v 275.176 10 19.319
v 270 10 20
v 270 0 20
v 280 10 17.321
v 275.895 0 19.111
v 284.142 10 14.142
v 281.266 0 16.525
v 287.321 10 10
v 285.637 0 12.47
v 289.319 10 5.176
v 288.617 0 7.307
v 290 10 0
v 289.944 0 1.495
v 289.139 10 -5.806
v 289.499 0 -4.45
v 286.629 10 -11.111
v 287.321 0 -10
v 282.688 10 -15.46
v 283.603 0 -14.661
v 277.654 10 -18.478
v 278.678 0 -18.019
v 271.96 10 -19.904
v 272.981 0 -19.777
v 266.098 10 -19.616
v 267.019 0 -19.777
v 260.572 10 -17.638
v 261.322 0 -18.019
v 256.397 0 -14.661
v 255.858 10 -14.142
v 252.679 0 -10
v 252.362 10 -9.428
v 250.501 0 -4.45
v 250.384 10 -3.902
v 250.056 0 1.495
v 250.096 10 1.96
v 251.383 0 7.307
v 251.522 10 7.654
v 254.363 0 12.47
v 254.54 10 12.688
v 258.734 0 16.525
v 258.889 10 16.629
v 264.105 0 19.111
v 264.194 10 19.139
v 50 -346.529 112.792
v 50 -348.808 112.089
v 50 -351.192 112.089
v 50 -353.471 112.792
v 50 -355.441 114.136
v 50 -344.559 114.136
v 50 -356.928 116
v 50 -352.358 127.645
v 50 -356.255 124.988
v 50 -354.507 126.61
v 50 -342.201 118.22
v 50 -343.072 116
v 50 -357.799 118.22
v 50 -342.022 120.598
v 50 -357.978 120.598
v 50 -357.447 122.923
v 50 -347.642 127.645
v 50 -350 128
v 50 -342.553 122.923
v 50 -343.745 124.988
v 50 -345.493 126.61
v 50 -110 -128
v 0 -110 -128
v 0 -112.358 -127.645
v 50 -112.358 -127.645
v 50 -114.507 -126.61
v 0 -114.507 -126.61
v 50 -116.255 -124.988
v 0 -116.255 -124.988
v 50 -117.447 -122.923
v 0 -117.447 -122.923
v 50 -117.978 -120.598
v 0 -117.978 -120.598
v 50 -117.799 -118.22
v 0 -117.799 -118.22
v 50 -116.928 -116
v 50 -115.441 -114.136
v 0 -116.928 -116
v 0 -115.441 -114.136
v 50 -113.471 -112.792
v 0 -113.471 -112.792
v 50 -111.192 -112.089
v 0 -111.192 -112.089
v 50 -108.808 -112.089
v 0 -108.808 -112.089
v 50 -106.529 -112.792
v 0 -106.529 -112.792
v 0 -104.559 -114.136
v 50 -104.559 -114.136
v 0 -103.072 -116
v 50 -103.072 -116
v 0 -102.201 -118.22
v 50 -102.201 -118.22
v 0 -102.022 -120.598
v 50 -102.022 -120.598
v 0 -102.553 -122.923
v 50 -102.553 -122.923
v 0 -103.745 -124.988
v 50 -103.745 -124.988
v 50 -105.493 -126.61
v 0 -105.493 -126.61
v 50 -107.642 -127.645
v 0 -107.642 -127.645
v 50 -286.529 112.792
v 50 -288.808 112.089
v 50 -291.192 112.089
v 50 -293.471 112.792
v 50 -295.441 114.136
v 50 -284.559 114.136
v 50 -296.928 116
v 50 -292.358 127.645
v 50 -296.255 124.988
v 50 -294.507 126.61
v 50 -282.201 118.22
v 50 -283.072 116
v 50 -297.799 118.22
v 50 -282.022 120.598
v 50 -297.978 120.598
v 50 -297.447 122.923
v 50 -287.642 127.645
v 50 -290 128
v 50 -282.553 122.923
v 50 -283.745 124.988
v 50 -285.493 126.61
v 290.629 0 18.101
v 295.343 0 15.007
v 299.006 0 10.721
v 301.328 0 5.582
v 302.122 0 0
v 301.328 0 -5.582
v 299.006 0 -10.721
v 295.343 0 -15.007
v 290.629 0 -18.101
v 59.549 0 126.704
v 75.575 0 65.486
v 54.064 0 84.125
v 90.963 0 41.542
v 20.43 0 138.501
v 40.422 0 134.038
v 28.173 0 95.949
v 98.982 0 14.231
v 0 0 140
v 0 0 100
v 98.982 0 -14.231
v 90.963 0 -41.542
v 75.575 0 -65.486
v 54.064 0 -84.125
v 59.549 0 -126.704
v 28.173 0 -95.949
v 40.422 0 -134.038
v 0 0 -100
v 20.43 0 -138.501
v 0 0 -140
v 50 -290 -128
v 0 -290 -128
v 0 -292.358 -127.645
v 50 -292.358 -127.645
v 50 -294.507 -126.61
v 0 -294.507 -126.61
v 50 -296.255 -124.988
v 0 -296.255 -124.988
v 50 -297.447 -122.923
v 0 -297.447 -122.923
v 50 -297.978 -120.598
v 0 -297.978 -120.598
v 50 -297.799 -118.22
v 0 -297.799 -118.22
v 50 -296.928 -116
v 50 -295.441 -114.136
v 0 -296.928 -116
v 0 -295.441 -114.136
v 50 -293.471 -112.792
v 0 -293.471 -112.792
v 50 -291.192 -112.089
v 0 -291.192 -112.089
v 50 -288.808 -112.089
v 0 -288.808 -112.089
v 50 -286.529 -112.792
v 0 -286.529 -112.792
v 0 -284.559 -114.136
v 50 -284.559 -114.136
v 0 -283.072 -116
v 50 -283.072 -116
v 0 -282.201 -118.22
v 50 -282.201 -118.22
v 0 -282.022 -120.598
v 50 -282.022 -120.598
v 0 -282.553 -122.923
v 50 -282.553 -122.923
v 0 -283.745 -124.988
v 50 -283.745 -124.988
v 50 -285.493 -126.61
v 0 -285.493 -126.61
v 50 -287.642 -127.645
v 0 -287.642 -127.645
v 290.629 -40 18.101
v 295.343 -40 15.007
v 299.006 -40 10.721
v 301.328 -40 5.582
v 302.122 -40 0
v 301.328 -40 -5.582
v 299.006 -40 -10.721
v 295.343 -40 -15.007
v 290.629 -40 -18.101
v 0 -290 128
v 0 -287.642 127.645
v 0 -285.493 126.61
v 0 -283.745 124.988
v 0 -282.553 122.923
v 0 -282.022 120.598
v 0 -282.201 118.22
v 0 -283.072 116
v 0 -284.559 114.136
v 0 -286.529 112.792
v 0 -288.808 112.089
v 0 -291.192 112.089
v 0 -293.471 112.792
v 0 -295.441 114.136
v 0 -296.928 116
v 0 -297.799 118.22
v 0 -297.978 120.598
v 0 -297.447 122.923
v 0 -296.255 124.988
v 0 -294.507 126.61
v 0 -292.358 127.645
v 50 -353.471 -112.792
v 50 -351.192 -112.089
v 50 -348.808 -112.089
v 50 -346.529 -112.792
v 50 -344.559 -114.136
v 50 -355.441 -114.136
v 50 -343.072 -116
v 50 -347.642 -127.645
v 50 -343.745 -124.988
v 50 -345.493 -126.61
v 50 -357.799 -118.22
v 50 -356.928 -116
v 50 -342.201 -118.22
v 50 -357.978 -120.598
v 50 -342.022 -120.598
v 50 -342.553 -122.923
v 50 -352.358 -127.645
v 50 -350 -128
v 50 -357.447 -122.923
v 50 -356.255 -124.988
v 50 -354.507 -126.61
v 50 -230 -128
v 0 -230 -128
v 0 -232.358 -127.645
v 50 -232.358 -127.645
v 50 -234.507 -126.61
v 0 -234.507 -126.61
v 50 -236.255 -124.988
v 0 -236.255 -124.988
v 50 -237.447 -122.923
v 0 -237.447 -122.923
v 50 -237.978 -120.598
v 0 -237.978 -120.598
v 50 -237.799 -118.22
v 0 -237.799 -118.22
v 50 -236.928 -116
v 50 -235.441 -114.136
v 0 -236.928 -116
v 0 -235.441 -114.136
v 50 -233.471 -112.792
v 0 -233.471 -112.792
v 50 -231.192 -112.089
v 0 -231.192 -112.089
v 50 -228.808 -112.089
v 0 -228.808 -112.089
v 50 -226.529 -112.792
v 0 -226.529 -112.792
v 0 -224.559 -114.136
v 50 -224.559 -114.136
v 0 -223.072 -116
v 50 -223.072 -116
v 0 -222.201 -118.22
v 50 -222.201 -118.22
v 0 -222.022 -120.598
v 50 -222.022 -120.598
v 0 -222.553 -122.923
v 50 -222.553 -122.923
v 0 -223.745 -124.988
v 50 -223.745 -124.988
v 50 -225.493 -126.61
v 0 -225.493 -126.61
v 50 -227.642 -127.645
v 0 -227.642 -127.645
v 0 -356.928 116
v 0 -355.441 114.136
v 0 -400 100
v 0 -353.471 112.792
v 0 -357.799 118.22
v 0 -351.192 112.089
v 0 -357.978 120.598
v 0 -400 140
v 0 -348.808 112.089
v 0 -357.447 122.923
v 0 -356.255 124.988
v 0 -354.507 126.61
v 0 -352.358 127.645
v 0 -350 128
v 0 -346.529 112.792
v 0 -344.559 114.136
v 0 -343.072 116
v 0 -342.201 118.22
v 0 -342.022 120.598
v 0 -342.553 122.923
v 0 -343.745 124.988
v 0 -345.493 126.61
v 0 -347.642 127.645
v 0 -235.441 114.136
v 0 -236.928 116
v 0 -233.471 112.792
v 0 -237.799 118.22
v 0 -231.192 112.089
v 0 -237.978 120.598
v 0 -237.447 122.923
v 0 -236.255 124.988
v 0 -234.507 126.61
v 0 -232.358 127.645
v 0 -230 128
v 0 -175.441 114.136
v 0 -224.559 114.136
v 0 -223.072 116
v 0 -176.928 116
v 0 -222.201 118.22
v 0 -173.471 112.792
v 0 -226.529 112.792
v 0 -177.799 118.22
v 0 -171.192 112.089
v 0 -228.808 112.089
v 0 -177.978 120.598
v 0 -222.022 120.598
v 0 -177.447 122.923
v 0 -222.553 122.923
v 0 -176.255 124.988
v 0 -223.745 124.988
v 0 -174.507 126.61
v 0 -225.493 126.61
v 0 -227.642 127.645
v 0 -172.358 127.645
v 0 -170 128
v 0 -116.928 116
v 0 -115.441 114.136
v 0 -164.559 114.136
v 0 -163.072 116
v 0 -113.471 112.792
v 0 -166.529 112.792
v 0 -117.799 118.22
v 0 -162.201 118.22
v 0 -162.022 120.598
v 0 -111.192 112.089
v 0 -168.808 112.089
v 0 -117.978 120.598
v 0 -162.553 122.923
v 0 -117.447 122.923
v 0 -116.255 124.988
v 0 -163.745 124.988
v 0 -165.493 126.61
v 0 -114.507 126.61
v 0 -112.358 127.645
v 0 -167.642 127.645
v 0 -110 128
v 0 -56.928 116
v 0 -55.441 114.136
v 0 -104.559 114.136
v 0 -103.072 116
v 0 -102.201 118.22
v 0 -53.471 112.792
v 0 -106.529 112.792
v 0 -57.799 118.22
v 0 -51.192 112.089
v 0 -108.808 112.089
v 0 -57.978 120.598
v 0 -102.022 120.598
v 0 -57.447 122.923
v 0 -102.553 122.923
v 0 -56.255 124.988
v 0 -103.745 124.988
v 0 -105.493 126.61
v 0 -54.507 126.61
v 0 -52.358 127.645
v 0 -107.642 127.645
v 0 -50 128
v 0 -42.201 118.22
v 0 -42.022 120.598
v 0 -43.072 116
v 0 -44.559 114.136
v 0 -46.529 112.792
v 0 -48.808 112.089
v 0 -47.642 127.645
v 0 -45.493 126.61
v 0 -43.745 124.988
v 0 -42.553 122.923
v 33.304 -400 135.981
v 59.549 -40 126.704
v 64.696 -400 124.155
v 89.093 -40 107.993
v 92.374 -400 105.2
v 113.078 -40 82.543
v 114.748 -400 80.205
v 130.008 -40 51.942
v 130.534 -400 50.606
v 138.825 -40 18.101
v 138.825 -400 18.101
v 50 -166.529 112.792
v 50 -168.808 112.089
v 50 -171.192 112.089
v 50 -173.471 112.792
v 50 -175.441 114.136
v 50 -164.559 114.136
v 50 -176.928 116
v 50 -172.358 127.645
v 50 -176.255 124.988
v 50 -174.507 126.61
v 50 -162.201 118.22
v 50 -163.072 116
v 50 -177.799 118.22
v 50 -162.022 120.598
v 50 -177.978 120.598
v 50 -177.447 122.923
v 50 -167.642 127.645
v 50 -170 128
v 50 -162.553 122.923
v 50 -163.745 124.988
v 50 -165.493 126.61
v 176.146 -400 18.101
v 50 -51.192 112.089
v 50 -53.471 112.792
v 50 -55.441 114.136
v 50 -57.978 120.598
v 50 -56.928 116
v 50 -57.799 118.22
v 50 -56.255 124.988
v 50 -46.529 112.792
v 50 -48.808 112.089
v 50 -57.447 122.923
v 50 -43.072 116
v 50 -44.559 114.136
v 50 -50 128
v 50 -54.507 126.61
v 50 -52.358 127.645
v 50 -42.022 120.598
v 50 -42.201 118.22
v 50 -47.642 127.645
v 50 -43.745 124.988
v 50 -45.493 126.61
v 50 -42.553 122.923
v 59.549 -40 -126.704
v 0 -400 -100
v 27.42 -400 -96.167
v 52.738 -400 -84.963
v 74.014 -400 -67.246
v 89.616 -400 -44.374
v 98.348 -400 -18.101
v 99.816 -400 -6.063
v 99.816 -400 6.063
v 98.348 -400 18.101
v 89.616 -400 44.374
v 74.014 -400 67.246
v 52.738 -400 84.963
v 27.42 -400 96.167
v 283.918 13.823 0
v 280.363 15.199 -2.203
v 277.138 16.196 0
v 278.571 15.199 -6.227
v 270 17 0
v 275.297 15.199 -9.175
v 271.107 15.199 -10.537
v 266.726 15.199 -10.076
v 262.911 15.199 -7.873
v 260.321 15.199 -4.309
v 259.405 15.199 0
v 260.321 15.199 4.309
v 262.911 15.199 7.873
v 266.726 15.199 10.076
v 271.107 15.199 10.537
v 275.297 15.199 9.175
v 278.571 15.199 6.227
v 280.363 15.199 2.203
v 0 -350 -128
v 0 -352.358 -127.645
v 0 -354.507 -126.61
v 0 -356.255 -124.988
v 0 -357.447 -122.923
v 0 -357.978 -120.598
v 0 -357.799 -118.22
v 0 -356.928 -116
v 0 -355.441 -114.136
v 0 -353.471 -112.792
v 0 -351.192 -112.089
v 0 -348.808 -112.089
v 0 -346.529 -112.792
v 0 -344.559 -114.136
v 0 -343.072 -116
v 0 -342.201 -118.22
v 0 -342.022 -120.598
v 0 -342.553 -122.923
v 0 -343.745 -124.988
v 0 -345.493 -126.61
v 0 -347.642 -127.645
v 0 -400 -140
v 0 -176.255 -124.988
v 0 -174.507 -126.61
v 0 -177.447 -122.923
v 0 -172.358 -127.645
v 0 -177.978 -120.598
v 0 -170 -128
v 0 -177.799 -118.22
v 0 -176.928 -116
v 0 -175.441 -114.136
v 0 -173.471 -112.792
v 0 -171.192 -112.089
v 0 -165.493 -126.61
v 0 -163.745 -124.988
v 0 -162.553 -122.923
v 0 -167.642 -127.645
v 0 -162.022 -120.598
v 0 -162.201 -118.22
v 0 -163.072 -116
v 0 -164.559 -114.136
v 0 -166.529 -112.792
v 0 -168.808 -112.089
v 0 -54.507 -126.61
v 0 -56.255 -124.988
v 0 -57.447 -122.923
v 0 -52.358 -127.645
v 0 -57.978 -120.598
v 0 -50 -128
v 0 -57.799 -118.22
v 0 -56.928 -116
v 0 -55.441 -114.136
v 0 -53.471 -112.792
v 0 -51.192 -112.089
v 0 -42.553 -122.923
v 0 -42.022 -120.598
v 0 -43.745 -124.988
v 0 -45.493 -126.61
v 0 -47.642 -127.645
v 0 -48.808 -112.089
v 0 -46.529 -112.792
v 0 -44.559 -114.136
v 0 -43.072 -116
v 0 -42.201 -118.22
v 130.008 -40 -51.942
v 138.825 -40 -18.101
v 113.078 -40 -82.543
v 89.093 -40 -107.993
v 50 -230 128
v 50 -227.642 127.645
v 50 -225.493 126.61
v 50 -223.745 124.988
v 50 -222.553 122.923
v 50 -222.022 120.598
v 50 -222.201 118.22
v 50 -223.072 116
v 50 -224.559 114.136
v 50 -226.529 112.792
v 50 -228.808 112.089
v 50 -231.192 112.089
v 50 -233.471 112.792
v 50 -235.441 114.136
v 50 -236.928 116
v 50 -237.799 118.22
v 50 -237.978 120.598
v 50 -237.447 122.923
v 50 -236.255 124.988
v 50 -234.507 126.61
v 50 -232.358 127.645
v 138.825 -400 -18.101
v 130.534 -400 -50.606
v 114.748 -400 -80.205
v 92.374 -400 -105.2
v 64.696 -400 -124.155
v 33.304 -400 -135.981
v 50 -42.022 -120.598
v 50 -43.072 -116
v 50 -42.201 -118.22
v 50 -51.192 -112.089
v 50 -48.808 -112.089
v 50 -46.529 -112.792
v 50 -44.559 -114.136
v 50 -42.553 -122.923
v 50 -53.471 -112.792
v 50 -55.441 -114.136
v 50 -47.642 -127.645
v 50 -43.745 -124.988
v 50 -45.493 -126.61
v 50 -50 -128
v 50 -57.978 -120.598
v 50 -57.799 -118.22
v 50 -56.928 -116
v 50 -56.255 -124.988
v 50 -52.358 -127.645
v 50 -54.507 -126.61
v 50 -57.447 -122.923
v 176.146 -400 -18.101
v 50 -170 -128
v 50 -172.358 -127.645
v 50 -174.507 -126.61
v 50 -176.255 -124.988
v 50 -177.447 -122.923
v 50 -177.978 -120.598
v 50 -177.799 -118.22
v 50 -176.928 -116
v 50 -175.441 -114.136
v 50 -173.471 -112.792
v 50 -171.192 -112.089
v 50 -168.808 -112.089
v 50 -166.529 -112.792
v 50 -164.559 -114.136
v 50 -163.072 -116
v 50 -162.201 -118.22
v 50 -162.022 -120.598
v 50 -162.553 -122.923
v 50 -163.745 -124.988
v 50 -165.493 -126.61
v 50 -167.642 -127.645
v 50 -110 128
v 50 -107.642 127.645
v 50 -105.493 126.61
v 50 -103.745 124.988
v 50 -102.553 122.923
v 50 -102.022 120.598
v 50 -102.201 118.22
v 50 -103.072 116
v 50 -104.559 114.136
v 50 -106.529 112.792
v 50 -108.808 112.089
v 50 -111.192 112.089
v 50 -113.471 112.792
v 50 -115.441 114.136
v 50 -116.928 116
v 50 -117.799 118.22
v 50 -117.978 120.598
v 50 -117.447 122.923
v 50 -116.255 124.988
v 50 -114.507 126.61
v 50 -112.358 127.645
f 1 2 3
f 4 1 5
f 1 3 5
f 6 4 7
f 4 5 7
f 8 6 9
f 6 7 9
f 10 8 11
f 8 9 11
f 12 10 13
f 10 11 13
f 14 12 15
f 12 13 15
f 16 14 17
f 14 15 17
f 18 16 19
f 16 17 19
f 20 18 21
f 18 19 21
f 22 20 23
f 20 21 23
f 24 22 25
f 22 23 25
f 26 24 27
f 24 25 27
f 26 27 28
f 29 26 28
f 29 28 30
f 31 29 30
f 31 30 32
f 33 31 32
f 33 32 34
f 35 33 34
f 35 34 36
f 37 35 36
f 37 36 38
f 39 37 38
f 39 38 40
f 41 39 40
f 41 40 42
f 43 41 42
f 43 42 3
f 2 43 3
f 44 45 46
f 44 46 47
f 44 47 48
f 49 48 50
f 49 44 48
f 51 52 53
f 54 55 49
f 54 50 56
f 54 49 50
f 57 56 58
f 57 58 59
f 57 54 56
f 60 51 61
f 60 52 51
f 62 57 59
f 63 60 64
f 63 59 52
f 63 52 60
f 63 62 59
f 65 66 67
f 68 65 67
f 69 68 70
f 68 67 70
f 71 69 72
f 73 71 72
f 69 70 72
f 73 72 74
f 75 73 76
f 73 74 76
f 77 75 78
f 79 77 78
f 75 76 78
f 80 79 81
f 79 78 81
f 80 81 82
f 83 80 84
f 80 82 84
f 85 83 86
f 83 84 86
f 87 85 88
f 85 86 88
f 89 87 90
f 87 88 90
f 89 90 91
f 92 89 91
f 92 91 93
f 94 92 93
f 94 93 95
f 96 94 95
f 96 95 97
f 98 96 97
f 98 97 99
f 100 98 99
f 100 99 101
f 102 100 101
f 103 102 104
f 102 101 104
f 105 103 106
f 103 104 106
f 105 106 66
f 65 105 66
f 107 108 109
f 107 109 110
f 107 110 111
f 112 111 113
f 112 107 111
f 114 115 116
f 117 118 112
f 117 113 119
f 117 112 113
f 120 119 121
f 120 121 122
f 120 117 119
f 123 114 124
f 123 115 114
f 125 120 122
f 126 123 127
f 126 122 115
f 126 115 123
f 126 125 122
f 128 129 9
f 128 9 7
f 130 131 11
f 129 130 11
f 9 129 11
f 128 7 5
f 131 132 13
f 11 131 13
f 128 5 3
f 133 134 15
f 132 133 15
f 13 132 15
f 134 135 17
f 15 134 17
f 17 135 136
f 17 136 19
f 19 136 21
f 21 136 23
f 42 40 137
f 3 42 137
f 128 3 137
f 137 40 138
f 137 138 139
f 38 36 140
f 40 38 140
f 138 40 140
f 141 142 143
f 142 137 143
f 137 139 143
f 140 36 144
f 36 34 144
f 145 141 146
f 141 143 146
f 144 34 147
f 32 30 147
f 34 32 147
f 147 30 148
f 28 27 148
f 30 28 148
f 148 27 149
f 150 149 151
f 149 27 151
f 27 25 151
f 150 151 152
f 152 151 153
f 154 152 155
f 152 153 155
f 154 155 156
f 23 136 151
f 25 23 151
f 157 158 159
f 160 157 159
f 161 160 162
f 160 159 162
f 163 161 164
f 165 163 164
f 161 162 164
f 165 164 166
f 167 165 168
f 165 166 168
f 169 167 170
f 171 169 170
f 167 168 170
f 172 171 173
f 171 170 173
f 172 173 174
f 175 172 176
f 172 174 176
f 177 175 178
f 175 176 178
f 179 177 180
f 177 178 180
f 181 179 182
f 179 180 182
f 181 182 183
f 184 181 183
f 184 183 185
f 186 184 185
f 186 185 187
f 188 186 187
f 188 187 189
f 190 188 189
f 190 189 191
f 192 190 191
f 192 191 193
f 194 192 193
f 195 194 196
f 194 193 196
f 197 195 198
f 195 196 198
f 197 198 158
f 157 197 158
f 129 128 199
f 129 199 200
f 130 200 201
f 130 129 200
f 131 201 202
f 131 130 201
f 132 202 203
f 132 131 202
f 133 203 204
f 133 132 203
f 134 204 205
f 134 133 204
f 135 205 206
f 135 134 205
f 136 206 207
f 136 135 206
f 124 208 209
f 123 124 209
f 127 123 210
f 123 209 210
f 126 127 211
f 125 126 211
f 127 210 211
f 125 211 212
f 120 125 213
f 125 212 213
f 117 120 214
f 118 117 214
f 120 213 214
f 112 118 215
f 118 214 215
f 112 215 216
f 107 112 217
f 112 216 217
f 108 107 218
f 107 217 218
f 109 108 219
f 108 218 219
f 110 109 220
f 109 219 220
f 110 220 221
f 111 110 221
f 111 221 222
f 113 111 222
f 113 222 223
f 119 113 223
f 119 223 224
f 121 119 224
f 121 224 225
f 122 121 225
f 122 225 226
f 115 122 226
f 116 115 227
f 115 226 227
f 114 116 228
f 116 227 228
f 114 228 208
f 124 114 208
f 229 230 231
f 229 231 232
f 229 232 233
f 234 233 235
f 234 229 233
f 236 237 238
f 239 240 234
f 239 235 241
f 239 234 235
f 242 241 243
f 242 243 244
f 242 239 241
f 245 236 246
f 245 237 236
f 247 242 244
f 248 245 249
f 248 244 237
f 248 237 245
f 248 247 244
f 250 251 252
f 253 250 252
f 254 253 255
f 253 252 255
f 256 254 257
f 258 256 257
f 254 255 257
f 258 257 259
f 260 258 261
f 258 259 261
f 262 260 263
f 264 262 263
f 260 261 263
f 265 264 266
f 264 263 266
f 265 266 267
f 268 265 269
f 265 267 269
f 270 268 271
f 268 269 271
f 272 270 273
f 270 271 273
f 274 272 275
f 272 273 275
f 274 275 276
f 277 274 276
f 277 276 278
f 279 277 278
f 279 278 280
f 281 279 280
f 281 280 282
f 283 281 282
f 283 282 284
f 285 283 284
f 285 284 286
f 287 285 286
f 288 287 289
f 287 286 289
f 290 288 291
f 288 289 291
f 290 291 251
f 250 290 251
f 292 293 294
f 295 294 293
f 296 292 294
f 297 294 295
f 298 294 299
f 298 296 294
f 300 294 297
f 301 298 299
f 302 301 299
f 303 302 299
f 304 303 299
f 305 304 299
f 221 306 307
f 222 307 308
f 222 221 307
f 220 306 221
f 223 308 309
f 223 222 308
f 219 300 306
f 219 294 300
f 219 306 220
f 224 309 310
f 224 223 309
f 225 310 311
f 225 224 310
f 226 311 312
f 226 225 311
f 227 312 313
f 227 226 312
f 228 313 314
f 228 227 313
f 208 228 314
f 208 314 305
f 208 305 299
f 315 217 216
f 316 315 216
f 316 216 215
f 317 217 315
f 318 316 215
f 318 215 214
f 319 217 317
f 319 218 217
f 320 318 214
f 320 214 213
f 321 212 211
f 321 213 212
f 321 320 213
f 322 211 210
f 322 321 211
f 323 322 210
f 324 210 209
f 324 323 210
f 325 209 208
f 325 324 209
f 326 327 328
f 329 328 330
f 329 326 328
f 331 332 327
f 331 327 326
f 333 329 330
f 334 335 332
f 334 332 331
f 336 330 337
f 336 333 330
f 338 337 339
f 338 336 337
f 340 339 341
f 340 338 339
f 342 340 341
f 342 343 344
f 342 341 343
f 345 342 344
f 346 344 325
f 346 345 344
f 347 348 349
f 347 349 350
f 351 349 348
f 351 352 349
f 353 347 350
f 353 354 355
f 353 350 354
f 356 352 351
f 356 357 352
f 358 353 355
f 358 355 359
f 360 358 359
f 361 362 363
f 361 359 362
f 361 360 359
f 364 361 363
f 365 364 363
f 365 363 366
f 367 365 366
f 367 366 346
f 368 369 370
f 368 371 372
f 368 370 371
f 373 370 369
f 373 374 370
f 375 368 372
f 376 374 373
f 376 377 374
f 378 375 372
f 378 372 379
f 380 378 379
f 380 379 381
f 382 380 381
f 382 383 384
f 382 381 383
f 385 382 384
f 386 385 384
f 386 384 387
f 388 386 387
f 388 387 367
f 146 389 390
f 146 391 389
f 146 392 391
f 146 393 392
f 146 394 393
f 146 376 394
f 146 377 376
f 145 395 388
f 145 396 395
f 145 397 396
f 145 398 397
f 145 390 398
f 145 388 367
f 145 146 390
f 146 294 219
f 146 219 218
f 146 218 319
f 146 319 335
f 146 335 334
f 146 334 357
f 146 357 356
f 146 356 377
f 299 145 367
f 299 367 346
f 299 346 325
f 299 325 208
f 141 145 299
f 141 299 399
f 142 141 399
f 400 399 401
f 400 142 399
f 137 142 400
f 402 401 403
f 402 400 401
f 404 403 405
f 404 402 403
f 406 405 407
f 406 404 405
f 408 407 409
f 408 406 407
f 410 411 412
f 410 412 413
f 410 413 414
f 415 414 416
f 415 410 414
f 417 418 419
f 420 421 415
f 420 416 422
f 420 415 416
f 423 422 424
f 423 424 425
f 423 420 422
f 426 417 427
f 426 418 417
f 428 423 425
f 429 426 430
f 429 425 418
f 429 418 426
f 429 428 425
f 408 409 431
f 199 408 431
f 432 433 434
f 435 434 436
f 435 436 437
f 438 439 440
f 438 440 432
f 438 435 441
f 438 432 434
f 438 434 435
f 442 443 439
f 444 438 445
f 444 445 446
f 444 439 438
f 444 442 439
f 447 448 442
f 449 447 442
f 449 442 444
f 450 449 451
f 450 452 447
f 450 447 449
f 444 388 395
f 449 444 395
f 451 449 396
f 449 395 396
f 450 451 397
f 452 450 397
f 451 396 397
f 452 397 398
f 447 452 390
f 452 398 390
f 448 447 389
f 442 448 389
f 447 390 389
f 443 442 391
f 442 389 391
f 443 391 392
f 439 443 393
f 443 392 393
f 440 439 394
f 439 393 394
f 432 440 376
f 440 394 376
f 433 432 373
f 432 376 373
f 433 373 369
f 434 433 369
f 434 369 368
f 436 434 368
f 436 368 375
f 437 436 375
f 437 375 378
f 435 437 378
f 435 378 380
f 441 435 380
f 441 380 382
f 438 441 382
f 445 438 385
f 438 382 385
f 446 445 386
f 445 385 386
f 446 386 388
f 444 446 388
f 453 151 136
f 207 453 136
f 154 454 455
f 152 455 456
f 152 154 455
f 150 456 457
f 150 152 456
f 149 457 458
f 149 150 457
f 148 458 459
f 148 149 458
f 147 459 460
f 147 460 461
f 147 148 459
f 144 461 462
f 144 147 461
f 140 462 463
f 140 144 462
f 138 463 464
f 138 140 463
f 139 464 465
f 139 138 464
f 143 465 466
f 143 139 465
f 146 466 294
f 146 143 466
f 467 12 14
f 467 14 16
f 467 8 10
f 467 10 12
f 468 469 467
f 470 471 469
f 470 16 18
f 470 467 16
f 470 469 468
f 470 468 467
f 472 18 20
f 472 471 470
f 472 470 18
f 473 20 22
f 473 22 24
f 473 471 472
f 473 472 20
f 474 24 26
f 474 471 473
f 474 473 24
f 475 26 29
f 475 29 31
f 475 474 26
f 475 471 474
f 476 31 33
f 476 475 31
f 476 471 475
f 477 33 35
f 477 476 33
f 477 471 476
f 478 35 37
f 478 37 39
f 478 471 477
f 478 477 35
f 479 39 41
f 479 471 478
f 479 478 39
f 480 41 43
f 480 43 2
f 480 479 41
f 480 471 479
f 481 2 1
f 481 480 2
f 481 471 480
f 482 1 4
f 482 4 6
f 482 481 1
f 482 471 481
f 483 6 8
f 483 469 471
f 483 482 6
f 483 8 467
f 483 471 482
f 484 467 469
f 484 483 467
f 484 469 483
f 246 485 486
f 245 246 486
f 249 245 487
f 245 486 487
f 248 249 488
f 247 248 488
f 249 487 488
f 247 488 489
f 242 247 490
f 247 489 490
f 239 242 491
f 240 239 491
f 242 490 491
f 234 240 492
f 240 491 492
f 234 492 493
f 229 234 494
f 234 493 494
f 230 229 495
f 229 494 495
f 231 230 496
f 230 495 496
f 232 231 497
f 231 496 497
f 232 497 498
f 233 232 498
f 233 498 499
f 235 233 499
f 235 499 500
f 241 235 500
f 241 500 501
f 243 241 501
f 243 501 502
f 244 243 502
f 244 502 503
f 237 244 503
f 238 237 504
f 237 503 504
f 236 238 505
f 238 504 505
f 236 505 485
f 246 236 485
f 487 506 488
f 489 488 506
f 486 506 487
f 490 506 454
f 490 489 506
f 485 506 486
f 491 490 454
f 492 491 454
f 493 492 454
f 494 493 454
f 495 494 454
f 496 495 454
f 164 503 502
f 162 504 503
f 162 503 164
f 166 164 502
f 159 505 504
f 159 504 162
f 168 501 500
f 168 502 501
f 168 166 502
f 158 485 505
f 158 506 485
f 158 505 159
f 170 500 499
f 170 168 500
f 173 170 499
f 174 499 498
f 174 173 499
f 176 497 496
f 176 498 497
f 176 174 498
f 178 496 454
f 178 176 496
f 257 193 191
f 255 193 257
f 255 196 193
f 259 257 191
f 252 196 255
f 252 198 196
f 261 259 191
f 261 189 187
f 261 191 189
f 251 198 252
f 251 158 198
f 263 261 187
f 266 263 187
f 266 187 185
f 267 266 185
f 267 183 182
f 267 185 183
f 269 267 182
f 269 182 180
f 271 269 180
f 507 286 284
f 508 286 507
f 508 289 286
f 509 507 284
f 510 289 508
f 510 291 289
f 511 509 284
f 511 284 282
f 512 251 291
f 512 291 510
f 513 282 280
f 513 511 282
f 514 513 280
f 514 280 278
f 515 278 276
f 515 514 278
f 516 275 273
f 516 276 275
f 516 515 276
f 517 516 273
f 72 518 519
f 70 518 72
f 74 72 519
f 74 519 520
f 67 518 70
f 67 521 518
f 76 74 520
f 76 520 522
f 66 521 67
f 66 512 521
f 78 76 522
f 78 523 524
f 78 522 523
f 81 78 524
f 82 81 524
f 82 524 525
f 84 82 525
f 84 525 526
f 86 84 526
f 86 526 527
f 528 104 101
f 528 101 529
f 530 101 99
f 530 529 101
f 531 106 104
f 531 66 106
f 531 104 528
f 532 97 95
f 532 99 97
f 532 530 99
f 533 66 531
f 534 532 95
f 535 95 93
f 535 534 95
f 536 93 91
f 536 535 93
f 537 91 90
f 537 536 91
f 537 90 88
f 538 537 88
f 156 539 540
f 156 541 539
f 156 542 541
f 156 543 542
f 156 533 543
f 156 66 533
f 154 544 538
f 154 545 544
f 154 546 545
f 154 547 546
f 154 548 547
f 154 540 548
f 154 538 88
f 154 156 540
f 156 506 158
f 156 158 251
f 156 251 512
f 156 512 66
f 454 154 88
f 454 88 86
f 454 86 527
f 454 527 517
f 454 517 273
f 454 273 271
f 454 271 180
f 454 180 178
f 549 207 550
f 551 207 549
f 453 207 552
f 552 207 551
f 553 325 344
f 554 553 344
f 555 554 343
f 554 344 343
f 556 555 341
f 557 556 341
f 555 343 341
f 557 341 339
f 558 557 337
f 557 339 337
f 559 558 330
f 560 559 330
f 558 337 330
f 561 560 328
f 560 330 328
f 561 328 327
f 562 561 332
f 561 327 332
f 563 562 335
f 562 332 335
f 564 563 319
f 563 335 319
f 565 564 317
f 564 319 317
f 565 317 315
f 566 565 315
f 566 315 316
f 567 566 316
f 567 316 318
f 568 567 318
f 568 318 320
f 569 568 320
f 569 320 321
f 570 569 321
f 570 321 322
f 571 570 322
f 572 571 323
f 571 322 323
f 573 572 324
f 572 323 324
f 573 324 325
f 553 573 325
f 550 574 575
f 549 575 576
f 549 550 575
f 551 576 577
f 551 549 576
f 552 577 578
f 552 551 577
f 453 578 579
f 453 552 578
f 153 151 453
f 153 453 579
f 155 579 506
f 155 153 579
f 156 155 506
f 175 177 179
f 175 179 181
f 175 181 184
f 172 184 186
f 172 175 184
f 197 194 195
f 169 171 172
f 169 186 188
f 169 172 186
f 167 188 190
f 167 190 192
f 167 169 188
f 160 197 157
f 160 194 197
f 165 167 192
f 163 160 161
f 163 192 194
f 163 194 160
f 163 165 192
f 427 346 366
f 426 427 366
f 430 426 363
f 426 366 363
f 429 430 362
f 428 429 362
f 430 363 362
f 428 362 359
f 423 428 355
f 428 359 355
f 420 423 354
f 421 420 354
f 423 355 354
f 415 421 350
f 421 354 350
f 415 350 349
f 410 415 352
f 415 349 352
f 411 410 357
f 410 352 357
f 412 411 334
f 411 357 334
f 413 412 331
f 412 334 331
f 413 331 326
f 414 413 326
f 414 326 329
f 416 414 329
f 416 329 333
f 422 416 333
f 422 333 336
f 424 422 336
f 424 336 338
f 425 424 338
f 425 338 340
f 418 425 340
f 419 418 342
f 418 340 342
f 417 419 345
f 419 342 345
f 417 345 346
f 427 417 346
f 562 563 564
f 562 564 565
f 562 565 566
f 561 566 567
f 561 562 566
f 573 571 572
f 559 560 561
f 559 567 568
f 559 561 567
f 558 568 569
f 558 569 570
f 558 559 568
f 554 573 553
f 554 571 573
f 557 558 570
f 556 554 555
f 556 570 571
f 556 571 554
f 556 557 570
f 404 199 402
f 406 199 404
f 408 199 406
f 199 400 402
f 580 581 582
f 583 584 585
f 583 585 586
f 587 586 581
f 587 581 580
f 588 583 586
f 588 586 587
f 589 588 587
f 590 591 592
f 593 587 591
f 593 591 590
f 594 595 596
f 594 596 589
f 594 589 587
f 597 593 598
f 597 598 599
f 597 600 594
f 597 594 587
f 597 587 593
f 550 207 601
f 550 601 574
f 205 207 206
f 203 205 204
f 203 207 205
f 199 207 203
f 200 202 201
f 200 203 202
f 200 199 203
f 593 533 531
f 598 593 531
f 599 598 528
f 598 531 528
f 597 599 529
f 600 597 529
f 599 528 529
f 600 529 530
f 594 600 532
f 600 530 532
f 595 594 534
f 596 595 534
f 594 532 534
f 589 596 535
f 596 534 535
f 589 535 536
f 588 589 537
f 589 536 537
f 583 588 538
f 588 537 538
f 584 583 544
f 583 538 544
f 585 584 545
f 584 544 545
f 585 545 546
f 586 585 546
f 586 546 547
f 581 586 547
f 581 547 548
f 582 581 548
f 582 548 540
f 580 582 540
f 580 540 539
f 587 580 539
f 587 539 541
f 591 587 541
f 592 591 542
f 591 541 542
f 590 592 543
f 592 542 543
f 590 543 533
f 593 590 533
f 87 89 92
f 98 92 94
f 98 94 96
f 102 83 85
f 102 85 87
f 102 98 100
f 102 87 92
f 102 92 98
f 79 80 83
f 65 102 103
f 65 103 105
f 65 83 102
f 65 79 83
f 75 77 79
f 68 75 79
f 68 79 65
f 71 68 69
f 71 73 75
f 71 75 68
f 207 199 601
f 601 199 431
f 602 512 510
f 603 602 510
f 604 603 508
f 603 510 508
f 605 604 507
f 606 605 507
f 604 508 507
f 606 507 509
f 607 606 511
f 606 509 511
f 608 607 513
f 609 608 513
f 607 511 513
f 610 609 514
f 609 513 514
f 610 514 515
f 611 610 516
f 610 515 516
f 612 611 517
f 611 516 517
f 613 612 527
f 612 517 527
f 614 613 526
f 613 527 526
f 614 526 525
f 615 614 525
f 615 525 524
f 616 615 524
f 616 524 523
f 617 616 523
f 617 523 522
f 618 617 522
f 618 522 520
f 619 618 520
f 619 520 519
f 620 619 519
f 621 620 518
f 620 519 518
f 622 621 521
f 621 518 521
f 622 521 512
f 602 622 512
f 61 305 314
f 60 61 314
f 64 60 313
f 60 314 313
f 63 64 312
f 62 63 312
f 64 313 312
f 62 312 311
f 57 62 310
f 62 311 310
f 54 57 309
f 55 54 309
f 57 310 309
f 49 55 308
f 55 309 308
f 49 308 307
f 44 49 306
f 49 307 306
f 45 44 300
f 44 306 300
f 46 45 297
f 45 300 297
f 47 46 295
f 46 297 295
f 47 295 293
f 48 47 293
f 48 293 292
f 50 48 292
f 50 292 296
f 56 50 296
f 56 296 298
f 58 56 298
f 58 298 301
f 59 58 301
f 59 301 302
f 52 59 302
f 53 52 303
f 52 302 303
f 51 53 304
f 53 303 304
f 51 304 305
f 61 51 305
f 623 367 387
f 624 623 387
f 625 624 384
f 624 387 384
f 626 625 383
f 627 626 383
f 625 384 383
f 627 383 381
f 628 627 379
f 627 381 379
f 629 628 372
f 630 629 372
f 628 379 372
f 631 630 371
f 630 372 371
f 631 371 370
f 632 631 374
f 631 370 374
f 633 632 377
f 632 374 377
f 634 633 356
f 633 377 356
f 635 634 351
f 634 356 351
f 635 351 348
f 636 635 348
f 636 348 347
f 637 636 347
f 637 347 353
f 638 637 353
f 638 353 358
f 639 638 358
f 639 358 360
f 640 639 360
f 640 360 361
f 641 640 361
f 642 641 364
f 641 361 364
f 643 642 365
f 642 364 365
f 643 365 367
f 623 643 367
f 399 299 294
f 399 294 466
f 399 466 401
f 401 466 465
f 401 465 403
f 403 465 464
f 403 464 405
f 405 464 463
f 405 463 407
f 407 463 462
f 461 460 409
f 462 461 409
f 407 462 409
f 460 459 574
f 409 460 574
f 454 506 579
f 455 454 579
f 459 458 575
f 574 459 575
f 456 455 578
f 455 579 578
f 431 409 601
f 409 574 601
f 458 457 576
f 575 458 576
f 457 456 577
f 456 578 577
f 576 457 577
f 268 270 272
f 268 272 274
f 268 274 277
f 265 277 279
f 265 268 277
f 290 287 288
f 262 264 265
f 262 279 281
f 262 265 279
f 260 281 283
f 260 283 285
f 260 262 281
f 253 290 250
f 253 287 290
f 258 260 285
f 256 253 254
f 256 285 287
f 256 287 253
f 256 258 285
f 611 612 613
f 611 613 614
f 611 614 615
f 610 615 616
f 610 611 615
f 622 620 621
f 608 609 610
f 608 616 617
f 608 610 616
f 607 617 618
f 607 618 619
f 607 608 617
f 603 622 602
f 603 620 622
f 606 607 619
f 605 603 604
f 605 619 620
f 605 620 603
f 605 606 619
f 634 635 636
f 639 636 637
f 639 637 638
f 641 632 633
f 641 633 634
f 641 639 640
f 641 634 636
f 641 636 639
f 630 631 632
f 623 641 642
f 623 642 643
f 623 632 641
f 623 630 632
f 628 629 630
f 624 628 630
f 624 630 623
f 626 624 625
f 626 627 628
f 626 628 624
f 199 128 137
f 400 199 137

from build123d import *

# Parameters (mm, degrees)
Y_KSEKLIK_EKSTR_ZYON1_DEPTH = 400
Y_KSEKLIK_EKSTR_ZYON3_DEPTH = 40
Y_KSEKLIK_EKSTR_ZYON4_DEPTH = 360
IZIM16_R                    = 20
Y_KSEKLIK_EKSTR_ZYON5_DEPTH = 10
IZIM17_R                    = 8
KES_EKSTR_ZYON21_DEPTH      = 50
IZIM19_W                    = 11.493054453
IZIM19_H                    = 360
KES_EKSTR_ZYON23_DEPTH      = 170
KES_EKSTR_ZYON24_DEPTH      = 170


# Read off the part's stored shape, not the designer's step: Kubbe1
with BuildPart() as part:
    # Çizim1 → Yükseklik-Ekstrüzyon1 (new body)
    with BuildSketch(Plane(origin=(0, 0, 0), x_dir=(1, 0, 0), z_dir=(0, 1, 0))):
        with BuildLine():
            Line((0, 140), (0, 100))
            ThreePointArc((0, 100), (100, 0), (0, -100))
            Line((0, -100), (0, -140))
            ThreePointArc((0, -140), (140, 0), (0, 140))
        make_face()
    extrude(amount=-Y_KSEKLIK_EKSTR_ZYON1_DEPTH)

    # Çizim2 → Yükseklik-Ekstrüzyon3 (add)
    with BuildSketch(Plane(origin=(0, 0, 0), x_dir=(1, 0, 0), z_dir=(0, 1, 0))):
        with BuildLine():
            Line((59.548618827, 126.704230378), (290.629357971, 18.10060434))
            ThreePointArc((290.629357971, 18.10060434), (302.122412424, 0), (290.629357971, -18.10060434))
            Line((290.629357971, -18.10060434), (59.548618827, -126.704230378))
            ThreePointArc((59.548618827, -126.704230378), (30.507439642, -136.635632712), (0, -140))
            Line((0, -140), (0, -100))
            ThreePointArc((0, -100), (100, 0), (0, 100))
            Line((0, 100), (0, 140))
            ThreePointArc((0, 140), (30.507439642, 136.635632712), (59.548618827, 126.704230378))
        make_face()
    extrude(amount=-Y_KSEKLIK_EKSTR_ZYON3_DEPTH)

    # Çizim5 → Yükseklik-Ekstrüzyon4 (add)
    with BuildSketch(Plane(origin=(0, -40, 0), x_dir=(1, 0, 0), z_dir=(0, 1, 0))):
        with BuildLine():
            Line((290.629357971, 18.10060434), (98.34819837, 18.10060434))
            ThreePointArc((98.34819837, 18.10060434), (100, 0), (98.34819837, -18.10060434))
            Line((98.34819837, -18.10060434), (290.629357971, -18.10060434))
            ThreePointArc((290.629357971, -18.10060434), (302.122412424, 0), (290.629357971, 18.10060434))
        make_face()
    extrude(amount=-Y_KSEKLIK_EKSTR_ZYON4_DEPTH)

    # Çizim16 → Yükseklik-Ekstrüzyon5 (add)
    with BuildSketch(Plane(origin=(0, 0, 0), x_dir=(1, 0, 0), z_dir=(0, 1, 0))):
        with Locations(Location((270, 0, 0), (0, 0, 270))):
            Circle(IZIM16_R)
    extrude(amount=Y_KSEKLIK_EKSTR_ZYON5_DEPTH)

    # Kubbe1 outline → Kubbe1 (revolve)
    with BuildSketch(Plane(origin=(270, 0, 0), x_dir=(1, 0, 0), z_dir=(0, 0, 1))):
        with BuildLine():
            Line((0, 10), (20.000000025, 9.99999998))
            ThreePointArc((20.000000025, 9.99999998), (10.594810065, 15.199457281), (0, 17))
            Line((0, 17), (0, 10))
        make_face()
    revolve(axis=Axis((270, 0, 0), (0, 1, 0)))

    # Çizim17 → Kes-Ekstrüzyon21 (cut)
    with BuildSketch(Plane.ZY):
        with Locations((120, -50)):
            Circle(IZIM17_R)
        with Locations((120, -110)):
            Circle(IZIM17_R)
        with Locations((120, -170)):
            Circle(IZIM17_R)
        with Locations((120, -230)):
            Circle(IZIM17_R)
        with Locations((120, -290)):
            Circle(IZIM17_R)
        with Locations((120, -350)):
            Circle(IZIM17_R)
        with Locations(Location((-120, -350, 0), (0, 0, 180))):
            Circle(IZIM17_R)
        with Locations(Location((-120, -290, 0), (0, 0, 180))):
            Circle(IZIM17_R)
        with Locations(Location((-120, -230, 0), (0, 0, 180))):
            Circle(IZIM17_R)
        with Locations(Location((-120, -170, 0), (0, 0, 180))):
            Circle(IZIM17_R)
        with Locations(Location((-120, -110, 0), (0, 0, 180))):
            Circle(IZIM17_R)
        with Locations(Location((-120, -50, 0), (0, 0, 180))):
            Circle(IZIM17_R)
    extrude(amount=-KES_EKSTR_ZYON21_DEPTH, mode=Mode.SUBTRACT)

    # Çizim19 → Kes-Ekstrüzyon23 (cut)
    with BuildSketch(Plane.XY.offset(18.10060434)):
        with Locations((296.375885197, -220)):
            Rectangle(IZIM19_W, IZIM19_H)
    extrude(amount=-KES_EKSTR_ZYON23_DEPTH, mode=Mode.SUBTRACT)

    # Çizim21 → Kes-Ekstrüzyon24 (cut)
    with BuildSketch(Plane.XY.offset(18.10060434)):
        Polygon((290.629357971, -40), (176.145834142, -400), (290.629357971, -400), align=None)
    extrude(amount=-KES_EKSTR_ZYON24_DEPTH, mode=Mode.SUBTRACT)


solid = part.part
